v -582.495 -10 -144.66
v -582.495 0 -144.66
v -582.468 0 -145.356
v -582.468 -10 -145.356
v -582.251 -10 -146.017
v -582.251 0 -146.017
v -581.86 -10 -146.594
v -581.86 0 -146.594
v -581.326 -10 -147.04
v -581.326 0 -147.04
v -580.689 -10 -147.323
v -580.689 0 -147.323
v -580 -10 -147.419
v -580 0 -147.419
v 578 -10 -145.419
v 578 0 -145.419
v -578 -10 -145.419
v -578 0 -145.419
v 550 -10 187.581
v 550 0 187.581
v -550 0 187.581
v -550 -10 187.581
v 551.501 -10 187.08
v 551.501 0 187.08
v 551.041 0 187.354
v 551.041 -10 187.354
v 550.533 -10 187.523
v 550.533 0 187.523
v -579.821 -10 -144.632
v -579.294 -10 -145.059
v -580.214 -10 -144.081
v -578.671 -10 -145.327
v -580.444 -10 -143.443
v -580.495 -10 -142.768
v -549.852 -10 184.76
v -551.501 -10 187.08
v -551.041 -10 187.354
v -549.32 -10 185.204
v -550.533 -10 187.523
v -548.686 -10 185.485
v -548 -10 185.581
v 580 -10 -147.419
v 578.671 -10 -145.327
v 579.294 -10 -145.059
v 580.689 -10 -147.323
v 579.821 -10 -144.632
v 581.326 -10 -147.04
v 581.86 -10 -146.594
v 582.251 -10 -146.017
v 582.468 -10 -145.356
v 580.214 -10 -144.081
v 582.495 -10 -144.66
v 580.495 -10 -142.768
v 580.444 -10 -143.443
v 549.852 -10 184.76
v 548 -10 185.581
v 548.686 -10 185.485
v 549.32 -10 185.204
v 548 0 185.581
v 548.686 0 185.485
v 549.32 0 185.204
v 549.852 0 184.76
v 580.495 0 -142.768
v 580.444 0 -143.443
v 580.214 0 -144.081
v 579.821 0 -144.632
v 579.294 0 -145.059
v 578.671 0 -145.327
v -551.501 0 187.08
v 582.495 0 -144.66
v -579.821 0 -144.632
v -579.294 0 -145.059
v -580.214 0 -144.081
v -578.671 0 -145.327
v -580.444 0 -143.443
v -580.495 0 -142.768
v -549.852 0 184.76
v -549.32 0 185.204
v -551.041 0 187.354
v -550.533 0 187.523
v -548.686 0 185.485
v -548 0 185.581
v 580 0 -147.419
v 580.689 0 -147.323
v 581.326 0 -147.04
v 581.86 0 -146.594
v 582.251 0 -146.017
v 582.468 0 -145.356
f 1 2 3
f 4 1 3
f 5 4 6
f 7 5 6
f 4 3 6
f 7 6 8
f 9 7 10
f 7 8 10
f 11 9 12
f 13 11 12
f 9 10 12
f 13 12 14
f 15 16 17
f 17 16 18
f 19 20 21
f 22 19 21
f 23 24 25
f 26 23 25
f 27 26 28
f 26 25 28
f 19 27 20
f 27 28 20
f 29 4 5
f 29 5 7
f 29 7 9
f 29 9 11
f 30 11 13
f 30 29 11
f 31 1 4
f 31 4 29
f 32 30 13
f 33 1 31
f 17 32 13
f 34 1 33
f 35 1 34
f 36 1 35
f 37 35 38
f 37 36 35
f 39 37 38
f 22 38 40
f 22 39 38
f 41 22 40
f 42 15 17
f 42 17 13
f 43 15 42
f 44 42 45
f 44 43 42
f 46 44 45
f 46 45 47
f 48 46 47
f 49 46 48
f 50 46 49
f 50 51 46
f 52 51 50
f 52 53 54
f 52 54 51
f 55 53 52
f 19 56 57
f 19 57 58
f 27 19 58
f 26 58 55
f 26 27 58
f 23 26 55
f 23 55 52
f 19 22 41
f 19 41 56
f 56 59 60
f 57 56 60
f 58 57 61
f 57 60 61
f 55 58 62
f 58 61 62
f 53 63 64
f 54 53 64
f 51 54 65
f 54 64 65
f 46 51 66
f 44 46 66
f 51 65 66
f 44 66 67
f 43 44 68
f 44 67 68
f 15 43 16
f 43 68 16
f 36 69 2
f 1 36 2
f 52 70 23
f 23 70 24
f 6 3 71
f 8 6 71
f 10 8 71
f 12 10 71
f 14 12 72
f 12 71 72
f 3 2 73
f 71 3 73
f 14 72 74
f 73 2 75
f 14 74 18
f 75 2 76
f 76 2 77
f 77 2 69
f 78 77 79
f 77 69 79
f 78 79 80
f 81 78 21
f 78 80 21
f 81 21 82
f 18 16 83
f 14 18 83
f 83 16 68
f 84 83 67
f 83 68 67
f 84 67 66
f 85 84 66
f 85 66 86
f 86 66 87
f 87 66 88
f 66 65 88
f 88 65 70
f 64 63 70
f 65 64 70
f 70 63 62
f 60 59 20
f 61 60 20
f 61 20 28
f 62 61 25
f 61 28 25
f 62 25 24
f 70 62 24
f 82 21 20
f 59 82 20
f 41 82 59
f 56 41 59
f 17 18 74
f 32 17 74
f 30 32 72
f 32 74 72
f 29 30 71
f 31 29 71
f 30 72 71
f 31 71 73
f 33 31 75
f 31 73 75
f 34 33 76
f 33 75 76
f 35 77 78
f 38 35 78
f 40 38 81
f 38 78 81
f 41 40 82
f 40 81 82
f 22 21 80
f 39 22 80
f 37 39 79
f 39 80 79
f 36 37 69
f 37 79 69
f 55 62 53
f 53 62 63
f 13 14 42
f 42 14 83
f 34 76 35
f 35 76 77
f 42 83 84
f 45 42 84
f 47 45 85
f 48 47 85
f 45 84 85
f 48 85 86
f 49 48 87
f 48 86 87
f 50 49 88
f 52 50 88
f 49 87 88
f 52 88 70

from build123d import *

# Parameters (mm, degrees)
F1_DEPTH = 10


with BuildPart() as f1:
    # F0 (on Front) → F1 (new body)
    with BuildSketch(Plane.XZ):
        with BuildLine():
            Line((0, 187.580806), (-550, 187.580806))
            ThreePointArc((-550, 187.580806), (-550.791112, 187.452333), (-551.500916, 187.080119))
            Line((-551.500916, 187.080119), (-582.495395, -144.660237))
            ThreePointArc((-582.495395, -144.660237), (-581.860029, -146.593552), (-580, -147.419194))
            Line((-580, -147.419194), (-6.159987, -147.419194))
            Line((-6.159987, -147.419194), (6.159987, -147.419194))
            Line((6.159987, -147.419194), (580, -147.419194))
            ThreePointArc((580, -147.419194), (581.860029, -146.593552), (582.495395, -144.660237))
            Line((582.495395, -144.660237), (551.500916, 187.080119))
            ThreePointArc((551.500916, 187.080119), (550.791112, 187.452333), (550, 187.580806))
            Line((550, 187.580806), (0, 187.580806))
        make_face()
        with BuildLine():
            ThreePointArc((-549.85201, 184.760109), (-549.012853, 185.366442), (-548, 185.580806))
            Line((-548, 185.580806), (0, 185.580806))
            Line((0, 185.580806), (548, 185.580806))
            ThreePointArc((548, 185.580806), (549.012853, 185.366442), (549.85201, 184.760109))
            Line((549.85201, 184.760109), (580.495395, -142.767521))
            ThreePointArc((580.495395, -142.767521), (579.820602, -144.632497), (578, -145.419194))
            Line((578, -145.419194), (0, -145.419194))
            Line((0, -145.419194), (-578, -145.419194))
            ThreePointArc((-578, -145.419194), (-579.820602, -144.632497), (-580.495395, -142.767521))
            Line((-580.495395, -142.767521), (-549.85201, 184.760109))
        make_face(mode=Mode.SUBTRACT)
    extrude(amount=F1_DEPTH)


solid = f1.part
